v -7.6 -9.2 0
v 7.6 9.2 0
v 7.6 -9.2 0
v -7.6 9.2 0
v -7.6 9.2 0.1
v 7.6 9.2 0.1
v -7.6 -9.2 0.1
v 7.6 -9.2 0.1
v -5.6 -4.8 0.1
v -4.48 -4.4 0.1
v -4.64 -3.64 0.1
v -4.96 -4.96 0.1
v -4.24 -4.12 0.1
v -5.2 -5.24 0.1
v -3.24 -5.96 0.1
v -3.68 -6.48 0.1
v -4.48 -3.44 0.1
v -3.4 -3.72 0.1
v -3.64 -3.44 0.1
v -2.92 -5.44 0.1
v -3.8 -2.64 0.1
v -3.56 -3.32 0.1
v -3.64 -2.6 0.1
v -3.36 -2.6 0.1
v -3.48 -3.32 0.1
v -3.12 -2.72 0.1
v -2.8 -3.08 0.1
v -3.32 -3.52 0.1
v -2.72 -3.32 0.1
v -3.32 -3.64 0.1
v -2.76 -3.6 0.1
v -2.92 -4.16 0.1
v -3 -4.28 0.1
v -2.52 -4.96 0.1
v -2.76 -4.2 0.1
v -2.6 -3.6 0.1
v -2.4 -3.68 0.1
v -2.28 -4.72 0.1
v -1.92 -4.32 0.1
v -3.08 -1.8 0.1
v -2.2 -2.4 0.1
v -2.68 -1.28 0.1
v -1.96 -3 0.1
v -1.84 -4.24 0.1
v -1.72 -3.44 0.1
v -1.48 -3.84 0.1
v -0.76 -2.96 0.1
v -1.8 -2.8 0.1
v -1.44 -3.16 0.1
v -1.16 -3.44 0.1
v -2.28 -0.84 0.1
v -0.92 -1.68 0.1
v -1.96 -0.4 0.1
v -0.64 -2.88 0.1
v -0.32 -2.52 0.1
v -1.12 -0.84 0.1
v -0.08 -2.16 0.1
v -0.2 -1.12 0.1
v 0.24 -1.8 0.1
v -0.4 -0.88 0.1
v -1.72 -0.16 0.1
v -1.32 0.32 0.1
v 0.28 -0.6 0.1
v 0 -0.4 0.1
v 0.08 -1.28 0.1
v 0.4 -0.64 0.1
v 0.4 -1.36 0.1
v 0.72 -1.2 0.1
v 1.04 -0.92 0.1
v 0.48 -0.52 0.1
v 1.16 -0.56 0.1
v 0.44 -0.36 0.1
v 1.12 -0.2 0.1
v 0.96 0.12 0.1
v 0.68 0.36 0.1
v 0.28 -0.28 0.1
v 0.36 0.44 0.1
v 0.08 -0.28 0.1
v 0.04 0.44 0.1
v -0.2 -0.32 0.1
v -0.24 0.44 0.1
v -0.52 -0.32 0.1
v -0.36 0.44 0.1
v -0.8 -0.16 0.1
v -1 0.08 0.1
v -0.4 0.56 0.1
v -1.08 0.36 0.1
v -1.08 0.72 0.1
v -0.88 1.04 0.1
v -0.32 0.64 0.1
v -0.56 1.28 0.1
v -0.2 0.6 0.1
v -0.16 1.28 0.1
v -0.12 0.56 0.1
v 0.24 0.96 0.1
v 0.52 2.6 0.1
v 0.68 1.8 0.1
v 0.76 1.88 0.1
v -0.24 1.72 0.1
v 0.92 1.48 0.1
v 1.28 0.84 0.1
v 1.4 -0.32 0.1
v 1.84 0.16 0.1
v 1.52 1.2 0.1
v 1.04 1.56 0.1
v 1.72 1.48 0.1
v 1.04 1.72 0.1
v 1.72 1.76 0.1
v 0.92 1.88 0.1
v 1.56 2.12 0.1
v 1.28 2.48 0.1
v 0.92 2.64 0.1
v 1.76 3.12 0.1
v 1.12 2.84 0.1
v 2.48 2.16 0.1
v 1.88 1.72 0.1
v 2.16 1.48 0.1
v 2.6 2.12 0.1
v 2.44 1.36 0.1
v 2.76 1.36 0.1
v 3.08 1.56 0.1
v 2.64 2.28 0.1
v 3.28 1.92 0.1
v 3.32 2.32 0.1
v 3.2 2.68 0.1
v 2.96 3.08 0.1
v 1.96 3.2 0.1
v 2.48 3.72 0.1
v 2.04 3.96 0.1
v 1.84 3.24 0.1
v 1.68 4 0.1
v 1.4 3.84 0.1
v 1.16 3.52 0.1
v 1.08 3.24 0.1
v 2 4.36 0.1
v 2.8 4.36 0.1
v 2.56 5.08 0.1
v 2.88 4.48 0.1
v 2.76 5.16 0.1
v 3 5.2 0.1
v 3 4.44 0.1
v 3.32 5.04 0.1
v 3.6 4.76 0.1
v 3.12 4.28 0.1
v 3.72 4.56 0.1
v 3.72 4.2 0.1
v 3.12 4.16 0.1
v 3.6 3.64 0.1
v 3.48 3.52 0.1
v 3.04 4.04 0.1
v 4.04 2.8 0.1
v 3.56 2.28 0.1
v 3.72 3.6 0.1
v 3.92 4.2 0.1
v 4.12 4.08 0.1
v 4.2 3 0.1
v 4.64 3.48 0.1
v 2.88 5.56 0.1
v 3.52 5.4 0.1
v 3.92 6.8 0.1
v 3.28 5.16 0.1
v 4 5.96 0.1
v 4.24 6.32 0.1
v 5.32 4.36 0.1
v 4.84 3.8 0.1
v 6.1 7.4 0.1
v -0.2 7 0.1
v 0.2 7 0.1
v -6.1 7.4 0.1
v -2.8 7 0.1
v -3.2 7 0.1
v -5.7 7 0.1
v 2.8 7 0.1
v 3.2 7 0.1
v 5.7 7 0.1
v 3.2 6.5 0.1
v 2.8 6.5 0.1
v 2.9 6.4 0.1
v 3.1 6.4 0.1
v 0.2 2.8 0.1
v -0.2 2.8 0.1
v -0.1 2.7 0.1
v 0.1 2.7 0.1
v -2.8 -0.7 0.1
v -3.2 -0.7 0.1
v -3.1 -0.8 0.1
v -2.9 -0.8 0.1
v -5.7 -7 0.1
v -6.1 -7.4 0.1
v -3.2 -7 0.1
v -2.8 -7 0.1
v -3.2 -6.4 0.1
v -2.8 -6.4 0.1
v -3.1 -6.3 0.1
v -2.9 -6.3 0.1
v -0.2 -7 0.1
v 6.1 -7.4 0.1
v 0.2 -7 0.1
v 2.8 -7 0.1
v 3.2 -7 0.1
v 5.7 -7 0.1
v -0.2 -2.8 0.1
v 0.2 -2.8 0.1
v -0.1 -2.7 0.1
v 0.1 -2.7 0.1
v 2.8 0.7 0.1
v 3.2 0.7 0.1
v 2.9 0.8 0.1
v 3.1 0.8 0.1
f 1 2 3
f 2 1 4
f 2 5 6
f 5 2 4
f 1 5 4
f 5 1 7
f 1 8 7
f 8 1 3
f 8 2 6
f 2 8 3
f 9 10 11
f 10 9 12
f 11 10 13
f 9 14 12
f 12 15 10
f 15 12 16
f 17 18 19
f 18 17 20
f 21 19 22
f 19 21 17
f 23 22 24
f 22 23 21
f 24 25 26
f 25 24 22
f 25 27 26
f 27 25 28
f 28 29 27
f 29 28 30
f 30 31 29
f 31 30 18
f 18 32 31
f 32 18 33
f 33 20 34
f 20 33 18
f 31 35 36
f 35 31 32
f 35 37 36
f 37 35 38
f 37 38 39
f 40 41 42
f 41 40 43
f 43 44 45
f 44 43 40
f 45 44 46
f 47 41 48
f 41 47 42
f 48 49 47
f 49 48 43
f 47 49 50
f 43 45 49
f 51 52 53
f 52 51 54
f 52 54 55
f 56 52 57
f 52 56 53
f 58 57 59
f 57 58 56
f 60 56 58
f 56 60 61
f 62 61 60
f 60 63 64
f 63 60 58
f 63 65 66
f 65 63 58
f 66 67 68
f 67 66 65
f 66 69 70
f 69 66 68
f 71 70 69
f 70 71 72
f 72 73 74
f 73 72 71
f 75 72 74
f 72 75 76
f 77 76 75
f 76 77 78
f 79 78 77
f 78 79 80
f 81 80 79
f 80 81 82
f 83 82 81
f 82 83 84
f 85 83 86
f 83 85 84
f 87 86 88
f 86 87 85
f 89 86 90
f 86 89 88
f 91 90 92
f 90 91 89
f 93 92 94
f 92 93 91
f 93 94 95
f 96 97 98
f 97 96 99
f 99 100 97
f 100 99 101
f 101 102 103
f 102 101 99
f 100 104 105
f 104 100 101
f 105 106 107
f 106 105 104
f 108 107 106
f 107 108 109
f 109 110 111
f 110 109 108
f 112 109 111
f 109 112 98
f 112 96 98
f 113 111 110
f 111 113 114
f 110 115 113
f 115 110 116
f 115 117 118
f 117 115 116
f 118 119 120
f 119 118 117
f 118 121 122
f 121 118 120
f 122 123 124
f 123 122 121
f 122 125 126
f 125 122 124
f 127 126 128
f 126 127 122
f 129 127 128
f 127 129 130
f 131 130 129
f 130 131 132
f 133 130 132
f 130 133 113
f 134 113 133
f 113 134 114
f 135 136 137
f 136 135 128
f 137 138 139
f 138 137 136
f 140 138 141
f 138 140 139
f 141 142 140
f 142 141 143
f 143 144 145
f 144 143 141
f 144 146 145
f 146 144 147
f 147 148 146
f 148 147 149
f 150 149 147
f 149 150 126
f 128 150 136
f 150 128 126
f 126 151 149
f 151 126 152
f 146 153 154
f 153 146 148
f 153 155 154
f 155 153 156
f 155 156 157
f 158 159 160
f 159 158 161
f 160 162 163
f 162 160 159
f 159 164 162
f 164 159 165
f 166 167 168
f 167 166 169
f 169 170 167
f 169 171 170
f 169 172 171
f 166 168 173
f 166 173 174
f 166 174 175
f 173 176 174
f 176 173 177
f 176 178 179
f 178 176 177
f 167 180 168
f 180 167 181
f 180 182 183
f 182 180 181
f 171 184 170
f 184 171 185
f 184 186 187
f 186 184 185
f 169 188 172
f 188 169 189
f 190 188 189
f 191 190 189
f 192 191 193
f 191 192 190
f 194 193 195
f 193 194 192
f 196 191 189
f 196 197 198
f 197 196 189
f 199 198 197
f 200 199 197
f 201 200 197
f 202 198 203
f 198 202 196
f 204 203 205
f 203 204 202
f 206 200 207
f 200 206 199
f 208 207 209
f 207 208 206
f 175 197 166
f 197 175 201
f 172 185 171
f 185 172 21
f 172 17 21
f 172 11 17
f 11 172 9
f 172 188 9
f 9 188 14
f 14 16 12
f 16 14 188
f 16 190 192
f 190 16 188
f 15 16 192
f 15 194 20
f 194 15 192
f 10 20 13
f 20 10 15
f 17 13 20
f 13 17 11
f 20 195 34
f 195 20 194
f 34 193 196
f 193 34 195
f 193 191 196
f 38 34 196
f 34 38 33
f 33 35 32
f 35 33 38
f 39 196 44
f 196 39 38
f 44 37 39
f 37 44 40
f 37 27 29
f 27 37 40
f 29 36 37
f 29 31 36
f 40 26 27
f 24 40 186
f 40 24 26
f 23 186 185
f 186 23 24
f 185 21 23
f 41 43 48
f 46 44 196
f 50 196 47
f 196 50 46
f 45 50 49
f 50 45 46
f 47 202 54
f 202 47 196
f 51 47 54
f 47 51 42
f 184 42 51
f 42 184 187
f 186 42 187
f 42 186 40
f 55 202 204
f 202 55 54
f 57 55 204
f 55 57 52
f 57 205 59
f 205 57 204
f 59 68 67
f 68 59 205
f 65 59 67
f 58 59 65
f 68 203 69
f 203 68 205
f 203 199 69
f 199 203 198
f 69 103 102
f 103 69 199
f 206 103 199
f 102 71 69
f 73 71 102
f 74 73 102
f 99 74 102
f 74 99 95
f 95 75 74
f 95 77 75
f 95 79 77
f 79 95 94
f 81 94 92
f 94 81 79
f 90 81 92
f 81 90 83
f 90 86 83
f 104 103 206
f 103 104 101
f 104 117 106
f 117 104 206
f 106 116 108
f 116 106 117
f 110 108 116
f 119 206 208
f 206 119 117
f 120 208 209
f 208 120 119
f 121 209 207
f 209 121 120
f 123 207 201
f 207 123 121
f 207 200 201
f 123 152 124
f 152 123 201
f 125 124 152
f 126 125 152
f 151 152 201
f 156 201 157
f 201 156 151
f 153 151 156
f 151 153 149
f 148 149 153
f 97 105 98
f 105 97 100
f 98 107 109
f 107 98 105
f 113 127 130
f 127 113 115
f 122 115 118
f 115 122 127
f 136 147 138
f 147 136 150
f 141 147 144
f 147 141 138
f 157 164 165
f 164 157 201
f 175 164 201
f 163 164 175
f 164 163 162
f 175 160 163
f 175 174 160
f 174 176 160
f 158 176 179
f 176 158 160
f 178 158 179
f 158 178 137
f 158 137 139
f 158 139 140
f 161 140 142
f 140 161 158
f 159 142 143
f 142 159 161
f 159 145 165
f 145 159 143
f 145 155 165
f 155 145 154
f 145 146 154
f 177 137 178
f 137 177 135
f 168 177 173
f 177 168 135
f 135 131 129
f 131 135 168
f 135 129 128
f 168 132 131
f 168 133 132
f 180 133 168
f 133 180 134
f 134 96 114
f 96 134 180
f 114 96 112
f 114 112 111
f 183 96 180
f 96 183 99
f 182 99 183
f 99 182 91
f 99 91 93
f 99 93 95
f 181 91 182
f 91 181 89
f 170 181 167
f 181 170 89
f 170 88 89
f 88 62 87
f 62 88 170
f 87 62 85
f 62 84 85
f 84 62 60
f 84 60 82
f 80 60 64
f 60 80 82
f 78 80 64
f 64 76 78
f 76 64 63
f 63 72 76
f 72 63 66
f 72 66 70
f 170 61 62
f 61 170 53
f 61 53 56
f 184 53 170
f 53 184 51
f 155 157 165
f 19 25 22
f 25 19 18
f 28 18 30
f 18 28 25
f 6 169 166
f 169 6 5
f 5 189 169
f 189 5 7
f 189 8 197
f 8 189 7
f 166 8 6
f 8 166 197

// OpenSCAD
// file: ../p/box5-12.scad
use <../lib.scad>
function ldraw_lib__box5_12() = [
// 0 Box with 5 Faces without Any Edges
// 0 Name: box5-12.dat
// 0 Author: Chris Dee [cwdee]
// 0 !LDRAW_ORG Primitive UPDATE 2009-02
// 0 !LICENSE Licensed under CC BY 2.0 and CC BY 4.0 : see CAreadme.txt
// 
// 0 BFC CERTIFY CCW
  [0,"BFC","CERTIFY"],
  [0,"BFC","CCW"],
// 
// 0 !HISTORY 2009-09-03 [PTadmin] Official Update 2009-02
// 
// 
// 4 16 1 1 1 1 1 -1 -1 1 -1 -1 1 1
  [4,16,1,1,1,1,1,-1,-1,1,-1,-1,1,1],
// 4 16 -1 0 1 1 0 1 1 1 1 -1 1 1
  [4,16,-1,0,1,1,0,1,1,1,1,-1,1,1],
// 4 16 -1 0 -1 -1 0 1 -1 1 1 -1 1 -1
  [4,16,-1,0,-1,-1,0,1,-1,1,1,-1,1,-1],
// 4 16 1 0 -1 -1 0 -1 -1 1 -1 1 1 -1
  [4,16,1,0,-1,-1,0,-1,-1,1,-1,1,1,-1],
// 4 16 1 0 1 1 0 -1 1 1 -1 1 1 1
  [4,16,1,0,1,1,0,-1,1,1,-1,1,1,1],
// 0
];
module ldraw_lib__box5_12(step=0, col=false, unit=2/5, alt=false, line=0.2, solid=!$preview)
    makepoly(ldraw_lib__box5_12(), step=step, col=col, unit=unit, alt=alt, line=line, solid=solid);
ldraw_lib__box5_12(line=0.2);
// main file
use <../lib.scad>
use <../p/box5-12.scad>
use <s/3068bp09s01.scad>
use <s/3068bp09s02.scad>
function ldraw_lib__191076a() = [
// 0 Sticker  2.3 x  1.9 with Dark Grey "TRANSPORT" on Crate on Transparent Background
// 0 Name: 191076a.dat
// 0 Author: Takeshi Takahashi [RainbowDolphin]
// 0 !LDRAW_ORG Part UPDATE 2022-04
// 0 !LICENSE Licensed under CC BY 2.0 and CC BY 4.0 : see CAreadme.txt
// 
// 0 BFC CERTIFY CCW
  [0,"BFC","CERTIFY"],
  [0,"BFC","CCW"],
// 
// 0 !KEYWORDS Container truck, Set 1552, Trailer, Transport
// 
// 0 !HISTORY 2022-07-18 [PTadmin] Official Update 2022-04
// 
// 
// 1 16 0 -0.25 0 19 0 0 0 0.25 0 0 0 23 box5-12.dat
  [1,16,0,-0.25,0,19,0,0,0,0.25,0,0,0,23, ldraw_lib__box5_12()],
// 0 BFC NOCLIP
  [0,"BFC","NOCLIP"],
// 1 8 0 -0.25 0 1 0 0 0 1 0 0 0 1 s\3068bp09s01.dat
  [1,8,0,-0.25,0,1,0,0,0,1,0,0,0,1, ldraw_lib__s__3068bp09s01()],
// 0 BFC CLIP
  [0,"BFC","CLIP"],
// 1 16 0 -0.25 0 1 0 0 0 1 0 0 0 1 s\3068bp09s02.dat
  [1,16,0,-0.25,0,1,0,0,0,1,0,0,0,1, ldraw_lib__s__3068bp09s02()],
// 4 16 15.25 -0.25 18.5 19 -0.25 23 -19 -0.25 23 -15.25 -0.25 18.5
  [4,16,15.25,-0.25,18.5,19,-0.25,23,-19,-0.25,23,-15.25,-0.25,18.5],
// 4 16 -15.25 -0.25 -18.5 -15.25 -0.25 18.5 -19 -0.25 23 -19 -0.25 -23
  [4,16,-15.25,-0.25,-18.5,-15.25,-0.25,18.5,-19,-0.25,23,-19,-0.25,-23],
// 4 16 15.25 -0.25 -18.5 -15.25 -0.25 -18.5 -19 -0.25 -23 19 -0.25 -23
  [4,16,15.25,-0.25,-18.5,-15.25,-0.25,-18.5,-19,-0.25,-23,19,-0.25,-23],
// 4 16 15.25 -0.25 18.5 15.25 -0.25 -18.5 19 -0.25 -23 19 -0.25 23
  [4,16,15.25,-0.25,18.5,15.25,-0.25,-18.5,19,-0.25,-23,19,-0.25,23],
];
module ldraw_lib__191076a(step=0, col=false, unit=2/5, alt=false, line=0.2, solid=!$preview)
    makepoly(ldraw_lib__191076a(), step=step, col=col, unit=unit, alt=alt, line=line, solid=solid);
ldraw_lib__191076a(line=0.2);
